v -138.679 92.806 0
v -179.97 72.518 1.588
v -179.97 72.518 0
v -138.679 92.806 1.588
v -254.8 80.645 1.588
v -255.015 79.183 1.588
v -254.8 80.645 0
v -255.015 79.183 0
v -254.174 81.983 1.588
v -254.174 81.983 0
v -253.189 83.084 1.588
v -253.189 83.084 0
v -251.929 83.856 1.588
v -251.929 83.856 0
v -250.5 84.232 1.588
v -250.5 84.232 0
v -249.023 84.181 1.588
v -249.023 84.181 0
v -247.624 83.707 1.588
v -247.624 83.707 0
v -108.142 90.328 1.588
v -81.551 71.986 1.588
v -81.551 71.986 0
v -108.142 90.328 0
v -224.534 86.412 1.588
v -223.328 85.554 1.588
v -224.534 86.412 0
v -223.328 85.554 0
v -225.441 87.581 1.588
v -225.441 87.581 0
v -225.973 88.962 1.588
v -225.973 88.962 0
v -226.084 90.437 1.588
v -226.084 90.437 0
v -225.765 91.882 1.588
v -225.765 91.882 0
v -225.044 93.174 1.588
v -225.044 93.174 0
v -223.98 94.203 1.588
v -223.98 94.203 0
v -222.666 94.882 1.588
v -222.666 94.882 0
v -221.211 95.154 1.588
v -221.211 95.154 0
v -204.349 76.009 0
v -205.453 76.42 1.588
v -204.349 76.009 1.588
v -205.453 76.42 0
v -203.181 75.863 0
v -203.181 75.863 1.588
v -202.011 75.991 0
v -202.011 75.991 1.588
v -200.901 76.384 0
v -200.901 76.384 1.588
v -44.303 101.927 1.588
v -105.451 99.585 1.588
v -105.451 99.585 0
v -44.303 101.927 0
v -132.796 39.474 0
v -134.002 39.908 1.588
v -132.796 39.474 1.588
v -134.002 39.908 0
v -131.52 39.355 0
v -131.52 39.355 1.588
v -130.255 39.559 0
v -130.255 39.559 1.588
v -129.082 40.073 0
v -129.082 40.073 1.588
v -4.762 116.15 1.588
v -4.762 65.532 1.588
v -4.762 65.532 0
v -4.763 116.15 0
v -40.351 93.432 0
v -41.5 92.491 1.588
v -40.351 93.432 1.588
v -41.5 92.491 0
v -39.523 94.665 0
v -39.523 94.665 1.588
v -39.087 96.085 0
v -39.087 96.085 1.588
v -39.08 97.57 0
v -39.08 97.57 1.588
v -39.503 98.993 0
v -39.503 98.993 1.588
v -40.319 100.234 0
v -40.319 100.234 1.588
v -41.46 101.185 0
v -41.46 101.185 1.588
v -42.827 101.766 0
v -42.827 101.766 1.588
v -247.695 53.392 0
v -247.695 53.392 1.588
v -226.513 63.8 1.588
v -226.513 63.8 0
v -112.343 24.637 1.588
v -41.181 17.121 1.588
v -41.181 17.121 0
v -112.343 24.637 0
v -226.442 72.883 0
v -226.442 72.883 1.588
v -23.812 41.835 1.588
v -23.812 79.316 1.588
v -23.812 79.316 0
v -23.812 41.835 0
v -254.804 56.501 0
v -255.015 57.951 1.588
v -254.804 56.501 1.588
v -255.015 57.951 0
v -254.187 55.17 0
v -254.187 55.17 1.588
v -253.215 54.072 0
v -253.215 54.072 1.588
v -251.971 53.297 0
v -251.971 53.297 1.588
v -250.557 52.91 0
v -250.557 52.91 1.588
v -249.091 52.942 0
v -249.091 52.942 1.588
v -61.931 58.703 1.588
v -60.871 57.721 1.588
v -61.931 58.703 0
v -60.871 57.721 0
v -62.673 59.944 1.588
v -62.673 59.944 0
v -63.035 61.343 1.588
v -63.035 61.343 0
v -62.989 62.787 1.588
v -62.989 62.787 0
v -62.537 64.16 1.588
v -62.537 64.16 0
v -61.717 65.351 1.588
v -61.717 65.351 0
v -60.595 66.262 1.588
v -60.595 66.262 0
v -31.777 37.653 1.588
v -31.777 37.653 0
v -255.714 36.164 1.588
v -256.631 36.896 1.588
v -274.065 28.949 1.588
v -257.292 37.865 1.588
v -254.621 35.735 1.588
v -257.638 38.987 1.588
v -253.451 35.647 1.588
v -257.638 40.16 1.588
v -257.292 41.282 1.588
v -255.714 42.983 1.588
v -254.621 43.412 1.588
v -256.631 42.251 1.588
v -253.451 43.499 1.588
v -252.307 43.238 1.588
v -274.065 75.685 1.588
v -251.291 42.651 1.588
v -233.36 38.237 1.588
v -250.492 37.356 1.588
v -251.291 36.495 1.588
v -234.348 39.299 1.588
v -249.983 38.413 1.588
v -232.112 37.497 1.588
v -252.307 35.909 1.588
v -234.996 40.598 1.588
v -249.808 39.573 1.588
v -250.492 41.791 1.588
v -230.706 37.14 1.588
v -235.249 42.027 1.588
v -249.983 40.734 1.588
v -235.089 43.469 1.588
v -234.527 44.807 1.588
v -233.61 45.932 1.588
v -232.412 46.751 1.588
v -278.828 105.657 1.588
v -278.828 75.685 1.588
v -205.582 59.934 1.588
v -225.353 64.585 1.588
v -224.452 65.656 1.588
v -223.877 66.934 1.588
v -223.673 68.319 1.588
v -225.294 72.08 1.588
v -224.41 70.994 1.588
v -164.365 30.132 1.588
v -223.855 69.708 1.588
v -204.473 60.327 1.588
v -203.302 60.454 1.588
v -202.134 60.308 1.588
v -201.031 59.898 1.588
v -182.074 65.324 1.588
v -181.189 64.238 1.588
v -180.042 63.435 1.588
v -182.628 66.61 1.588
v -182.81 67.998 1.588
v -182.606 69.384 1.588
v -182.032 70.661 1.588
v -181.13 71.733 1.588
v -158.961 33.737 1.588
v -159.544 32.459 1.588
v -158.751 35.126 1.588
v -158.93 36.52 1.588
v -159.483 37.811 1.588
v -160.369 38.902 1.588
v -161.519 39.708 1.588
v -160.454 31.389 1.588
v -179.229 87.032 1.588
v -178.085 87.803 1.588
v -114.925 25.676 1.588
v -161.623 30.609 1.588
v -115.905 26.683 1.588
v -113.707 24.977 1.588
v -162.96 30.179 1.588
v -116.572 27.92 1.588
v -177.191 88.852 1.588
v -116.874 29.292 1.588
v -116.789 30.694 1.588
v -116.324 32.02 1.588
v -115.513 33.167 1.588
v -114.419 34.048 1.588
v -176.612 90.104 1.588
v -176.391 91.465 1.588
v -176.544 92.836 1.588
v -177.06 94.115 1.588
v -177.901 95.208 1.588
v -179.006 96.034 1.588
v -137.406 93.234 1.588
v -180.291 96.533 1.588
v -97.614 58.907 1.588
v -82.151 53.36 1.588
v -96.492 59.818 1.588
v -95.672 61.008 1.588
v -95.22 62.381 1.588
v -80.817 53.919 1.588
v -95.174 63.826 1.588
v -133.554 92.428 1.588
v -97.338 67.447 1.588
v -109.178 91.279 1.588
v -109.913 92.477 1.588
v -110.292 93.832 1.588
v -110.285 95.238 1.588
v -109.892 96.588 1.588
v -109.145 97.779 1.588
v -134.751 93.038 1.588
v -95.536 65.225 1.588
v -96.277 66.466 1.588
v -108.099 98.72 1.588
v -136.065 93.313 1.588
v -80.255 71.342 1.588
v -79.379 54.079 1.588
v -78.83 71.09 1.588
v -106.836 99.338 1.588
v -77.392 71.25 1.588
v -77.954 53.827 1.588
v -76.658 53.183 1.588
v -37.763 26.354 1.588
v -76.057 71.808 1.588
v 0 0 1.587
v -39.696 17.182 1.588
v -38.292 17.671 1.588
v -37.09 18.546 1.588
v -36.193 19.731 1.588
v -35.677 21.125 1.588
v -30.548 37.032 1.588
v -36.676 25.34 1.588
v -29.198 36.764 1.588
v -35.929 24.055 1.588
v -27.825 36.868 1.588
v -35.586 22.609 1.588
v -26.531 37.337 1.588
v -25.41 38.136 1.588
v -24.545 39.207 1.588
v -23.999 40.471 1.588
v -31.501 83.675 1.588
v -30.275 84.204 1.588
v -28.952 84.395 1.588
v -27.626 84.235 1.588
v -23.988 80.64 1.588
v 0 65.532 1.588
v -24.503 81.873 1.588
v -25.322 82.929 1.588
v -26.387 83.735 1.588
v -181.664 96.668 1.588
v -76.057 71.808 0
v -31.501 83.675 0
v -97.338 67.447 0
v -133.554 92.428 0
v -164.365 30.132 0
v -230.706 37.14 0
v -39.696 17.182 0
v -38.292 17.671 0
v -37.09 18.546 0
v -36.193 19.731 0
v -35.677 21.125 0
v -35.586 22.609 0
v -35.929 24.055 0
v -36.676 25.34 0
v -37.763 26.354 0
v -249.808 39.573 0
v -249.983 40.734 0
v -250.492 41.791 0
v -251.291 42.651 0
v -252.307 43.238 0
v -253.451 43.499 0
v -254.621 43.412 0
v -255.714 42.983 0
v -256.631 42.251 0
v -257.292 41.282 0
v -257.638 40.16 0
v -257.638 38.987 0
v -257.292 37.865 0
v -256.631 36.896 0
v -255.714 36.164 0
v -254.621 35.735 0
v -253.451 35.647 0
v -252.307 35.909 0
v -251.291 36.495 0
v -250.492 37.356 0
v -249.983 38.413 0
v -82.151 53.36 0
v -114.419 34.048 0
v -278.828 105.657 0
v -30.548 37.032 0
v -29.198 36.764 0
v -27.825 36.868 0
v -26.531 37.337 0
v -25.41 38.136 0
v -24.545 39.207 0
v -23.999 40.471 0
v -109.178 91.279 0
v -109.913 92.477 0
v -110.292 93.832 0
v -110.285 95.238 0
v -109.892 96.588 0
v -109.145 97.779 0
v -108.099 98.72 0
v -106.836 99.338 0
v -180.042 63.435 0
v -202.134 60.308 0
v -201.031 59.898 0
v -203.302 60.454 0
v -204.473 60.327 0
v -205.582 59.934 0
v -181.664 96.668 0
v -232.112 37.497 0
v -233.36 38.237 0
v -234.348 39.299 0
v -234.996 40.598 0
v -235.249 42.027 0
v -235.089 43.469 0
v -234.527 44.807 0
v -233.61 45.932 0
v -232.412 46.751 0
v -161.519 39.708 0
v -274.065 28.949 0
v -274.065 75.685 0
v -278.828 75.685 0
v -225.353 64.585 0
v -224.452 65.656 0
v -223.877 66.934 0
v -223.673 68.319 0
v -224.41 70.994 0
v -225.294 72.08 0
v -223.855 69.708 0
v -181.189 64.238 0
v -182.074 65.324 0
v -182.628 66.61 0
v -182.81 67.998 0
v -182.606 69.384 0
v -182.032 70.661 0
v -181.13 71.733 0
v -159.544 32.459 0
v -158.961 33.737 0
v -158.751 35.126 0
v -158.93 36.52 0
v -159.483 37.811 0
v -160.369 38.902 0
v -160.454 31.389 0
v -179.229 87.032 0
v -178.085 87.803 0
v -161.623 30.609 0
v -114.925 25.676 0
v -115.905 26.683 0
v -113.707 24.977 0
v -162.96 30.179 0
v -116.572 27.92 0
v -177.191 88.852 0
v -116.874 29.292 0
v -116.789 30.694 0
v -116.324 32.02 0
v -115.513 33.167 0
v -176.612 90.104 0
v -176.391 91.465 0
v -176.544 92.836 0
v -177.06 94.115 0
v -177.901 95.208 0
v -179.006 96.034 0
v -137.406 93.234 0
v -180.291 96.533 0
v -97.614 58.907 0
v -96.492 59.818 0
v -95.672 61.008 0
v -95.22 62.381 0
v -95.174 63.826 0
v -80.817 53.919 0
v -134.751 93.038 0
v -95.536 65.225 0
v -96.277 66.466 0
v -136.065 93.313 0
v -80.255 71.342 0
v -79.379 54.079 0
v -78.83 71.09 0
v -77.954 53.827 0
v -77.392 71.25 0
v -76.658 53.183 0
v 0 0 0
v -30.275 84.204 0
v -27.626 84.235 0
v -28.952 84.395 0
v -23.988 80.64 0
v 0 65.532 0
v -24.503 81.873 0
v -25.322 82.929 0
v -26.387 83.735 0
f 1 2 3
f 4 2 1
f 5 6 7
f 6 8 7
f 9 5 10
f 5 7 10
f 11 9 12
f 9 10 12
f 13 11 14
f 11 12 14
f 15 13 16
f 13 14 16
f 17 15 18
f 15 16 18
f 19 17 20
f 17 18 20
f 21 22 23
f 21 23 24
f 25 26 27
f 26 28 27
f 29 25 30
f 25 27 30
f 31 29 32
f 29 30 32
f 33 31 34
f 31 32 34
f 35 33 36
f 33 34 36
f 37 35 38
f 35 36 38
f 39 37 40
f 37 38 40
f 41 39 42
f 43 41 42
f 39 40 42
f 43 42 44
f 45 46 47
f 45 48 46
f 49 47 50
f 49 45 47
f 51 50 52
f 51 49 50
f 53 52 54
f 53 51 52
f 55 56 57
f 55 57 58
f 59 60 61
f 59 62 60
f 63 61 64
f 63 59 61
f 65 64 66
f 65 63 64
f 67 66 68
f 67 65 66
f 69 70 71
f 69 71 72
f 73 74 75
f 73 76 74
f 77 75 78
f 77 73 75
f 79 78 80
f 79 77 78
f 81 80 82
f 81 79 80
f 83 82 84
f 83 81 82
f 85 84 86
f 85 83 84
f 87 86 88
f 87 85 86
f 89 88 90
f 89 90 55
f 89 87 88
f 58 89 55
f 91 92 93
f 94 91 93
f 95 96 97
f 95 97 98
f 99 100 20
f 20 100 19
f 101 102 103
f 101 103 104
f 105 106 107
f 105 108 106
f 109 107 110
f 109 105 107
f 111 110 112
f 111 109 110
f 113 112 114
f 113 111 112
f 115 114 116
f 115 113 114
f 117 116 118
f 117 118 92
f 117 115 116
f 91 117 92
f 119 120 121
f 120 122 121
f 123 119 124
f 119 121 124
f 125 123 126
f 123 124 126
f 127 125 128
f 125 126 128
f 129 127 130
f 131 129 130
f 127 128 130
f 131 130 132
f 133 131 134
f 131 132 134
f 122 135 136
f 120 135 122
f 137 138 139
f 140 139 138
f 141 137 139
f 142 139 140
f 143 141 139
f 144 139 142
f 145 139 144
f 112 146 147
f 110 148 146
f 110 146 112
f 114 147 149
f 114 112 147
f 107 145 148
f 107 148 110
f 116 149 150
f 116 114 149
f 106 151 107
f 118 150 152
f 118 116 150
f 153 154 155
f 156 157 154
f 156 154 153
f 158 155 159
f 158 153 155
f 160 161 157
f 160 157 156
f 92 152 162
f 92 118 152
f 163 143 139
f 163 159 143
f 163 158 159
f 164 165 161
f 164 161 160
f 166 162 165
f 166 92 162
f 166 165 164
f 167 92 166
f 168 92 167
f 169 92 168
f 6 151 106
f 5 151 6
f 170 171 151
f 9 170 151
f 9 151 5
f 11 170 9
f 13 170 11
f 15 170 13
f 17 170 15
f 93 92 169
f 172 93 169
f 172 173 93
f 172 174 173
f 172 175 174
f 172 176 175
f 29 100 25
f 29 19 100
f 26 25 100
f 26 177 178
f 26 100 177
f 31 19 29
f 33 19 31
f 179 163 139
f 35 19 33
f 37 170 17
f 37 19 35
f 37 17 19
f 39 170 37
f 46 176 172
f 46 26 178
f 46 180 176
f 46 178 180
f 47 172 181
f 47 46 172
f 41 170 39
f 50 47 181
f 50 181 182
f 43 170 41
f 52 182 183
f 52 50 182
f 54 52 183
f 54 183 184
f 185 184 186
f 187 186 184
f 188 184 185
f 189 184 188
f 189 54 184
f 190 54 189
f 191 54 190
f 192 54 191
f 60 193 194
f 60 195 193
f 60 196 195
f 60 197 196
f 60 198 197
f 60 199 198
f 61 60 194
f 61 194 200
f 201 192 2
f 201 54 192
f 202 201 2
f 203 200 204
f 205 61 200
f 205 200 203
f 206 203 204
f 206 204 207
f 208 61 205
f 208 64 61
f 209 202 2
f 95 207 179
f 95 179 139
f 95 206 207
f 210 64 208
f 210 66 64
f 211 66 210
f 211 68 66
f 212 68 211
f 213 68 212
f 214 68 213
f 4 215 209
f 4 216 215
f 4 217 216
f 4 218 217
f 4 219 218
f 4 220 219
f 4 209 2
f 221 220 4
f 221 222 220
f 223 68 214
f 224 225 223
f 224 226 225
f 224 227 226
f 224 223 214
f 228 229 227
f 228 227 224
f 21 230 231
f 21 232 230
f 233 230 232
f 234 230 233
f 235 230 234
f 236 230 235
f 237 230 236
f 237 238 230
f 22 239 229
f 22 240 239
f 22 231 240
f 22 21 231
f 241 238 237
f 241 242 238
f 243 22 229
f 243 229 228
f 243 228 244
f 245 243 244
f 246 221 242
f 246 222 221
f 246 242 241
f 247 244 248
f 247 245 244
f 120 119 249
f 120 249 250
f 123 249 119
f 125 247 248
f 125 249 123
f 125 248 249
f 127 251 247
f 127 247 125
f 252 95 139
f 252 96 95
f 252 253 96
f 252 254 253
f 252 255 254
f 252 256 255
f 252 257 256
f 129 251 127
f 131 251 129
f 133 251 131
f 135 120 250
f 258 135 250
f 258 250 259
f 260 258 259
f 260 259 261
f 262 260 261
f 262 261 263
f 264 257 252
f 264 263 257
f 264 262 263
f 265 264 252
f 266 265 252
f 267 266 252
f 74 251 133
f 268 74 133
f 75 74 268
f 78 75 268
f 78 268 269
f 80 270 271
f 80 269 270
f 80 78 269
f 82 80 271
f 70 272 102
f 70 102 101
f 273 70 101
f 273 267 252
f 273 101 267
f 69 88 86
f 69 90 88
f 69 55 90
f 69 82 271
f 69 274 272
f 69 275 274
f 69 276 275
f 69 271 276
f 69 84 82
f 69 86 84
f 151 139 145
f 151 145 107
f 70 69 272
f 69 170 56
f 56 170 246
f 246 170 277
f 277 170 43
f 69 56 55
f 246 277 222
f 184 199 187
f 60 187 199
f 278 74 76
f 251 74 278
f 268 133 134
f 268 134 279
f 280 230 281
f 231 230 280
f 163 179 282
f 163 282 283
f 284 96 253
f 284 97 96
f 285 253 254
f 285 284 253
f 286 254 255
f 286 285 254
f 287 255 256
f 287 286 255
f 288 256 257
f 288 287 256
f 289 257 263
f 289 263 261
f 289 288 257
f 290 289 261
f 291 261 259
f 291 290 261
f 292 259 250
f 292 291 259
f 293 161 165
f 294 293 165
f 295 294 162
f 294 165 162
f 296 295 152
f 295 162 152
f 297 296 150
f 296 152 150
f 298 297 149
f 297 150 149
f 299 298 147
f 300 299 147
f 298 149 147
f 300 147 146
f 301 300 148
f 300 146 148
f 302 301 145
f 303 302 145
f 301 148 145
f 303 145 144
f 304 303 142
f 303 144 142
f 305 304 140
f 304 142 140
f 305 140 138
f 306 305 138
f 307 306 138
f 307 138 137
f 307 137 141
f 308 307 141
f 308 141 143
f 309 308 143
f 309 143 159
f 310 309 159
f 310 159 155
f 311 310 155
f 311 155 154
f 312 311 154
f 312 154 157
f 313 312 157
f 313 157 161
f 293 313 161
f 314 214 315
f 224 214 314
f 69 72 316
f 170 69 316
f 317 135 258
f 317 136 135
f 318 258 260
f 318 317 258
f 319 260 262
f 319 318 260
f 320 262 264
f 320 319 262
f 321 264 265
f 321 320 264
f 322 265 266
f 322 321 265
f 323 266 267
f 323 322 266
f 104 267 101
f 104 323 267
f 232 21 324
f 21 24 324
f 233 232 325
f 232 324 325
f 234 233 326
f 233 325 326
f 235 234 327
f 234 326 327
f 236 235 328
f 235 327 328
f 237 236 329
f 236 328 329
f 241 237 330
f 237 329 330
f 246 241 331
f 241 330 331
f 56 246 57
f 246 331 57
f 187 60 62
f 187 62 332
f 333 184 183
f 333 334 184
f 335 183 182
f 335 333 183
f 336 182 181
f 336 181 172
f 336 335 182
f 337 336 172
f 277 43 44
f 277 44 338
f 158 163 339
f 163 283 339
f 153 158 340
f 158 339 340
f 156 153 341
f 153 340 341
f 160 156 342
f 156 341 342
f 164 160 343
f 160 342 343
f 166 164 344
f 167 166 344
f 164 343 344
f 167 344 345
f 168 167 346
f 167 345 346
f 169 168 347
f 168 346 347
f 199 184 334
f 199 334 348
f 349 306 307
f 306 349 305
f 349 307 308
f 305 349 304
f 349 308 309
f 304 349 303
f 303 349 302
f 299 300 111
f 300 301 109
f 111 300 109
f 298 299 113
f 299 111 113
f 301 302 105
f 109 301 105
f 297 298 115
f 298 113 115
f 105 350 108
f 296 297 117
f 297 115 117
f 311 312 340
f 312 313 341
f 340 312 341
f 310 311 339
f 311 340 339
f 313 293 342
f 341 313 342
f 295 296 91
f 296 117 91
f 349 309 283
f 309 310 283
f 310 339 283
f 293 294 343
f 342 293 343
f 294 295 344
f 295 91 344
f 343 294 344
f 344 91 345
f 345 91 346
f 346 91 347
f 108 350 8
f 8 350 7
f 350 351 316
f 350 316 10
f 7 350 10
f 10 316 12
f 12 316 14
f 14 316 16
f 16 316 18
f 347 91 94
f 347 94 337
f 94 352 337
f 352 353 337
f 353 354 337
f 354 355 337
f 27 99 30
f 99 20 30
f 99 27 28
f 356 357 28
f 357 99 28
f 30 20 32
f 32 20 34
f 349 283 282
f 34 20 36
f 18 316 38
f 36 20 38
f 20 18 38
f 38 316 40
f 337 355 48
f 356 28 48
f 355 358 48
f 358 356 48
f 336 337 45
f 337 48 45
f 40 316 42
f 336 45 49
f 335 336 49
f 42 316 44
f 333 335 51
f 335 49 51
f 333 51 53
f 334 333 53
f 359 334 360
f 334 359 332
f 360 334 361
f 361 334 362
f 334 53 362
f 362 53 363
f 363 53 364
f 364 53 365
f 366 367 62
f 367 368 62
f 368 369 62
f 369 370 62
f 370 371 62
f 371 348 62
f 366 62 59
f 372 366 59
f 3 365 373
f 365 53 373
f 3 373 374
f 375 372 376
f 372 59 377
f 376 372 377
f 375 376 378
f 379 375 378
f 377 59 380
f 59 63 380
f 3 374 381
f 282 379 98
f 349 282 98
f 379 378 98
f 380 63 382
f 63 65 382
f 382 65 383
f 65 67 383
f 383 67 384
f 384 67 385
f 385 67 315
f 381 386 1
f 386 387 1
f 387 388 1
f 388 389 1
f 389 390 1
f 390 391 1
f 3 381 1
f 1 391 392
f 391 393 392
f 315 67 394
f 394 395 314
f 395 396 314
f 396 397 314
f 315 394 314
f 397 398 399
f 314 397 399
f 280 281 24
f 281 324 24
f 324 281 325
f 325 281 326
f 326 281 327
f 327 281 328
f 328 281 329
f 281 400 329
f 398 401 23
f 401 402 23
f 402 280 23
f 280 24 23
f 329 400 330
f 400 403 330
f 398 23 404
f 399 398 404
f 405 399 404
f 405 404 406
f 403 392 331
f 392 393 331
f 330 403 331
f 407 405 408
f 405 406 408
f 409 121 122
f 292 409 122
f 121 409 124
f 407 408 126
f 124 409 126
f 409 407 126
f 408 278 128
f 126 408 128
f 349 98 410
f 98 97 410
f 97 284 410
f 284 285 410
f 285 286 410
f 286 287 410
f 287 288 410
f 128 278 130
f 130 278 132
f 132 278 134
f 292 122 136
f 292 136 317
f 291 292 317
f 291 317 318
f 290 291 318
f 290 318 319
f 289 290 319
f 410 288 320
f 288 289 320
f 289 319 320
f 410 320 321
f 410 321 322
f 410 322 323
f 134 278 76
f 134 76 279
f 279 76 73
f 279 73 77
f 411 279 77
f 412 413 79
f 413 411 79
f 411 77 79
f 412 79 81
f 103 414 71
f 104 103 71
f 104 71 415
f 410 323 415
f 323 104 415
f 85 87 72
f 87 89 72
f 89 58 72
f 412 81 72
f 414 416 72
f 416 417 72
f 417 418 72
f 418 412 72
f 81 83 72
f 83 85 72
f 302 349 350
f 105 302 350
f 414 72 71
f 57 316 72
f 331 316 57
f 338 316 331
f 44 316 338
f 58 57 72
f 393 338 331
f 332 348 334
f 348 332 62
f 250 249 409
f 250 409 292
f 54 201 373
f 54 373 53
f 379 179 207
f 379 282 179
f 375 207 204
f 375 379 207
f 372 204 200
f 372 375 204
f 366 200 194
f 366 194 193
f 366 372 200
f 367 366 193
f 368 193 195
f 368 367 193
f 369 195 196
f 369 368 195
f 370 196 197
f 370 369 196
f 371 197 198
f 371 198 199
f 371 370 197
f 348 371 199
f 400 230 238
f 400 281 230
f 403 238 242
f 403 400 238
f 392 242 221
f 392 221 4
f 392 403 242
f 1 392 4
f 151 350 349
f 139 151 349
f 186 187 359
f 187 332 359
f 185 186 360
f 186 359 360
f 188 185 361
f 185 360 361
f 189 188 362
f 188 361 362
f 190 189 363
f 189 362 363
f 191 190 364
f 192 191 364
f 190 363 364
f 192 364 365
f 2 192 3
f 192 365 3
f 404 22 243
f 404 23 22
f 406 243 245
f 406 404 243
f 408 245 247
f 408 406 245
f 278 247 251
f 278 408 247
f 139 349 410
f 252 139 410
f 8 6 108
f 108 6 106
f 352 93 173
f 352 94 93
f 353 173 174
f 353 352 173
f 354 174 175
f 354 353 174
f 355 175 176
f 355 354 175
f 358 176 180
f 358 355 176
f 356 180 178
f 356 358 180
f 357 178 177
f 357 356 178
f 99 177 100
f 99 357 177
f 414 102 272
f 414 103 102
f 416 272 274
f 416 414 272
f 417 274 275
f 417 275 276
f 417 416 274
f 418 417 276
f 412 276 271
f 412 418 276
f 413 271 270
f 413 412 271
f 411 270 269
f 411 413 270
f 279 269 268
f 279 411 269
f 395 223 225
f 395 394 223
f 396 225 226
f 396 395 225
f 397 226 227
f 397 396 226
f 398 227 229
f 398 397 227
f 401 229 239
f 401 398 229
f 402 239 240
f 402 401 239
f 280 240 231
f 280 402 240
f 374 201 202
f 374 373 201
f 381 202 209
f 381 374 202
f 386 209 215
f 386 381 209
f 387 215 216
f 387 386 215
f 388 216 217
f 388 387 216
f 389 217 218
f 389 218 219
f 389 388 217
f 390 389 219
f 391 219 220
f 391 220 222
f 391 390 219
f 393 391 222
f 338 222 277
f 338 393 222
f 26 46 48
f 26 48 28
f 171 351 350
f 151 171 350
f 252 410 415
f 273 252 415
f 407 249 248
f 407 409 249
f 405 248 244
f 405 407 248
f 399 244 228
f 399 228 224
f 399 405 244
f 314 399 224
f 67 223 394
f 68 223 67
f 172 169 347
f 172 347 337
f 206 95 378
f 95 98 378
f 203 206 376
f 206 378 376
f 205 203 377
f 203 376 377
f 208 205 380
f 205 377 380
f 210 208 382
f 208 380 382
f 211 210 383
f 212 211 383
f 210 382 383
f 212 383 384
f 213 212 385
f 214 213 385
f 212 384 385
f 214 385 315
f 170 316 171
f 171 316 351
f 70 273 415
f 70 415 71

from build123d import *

# Parameters (mm, degrees)
BOSS_EXTRUDE1_DEPTH = 1.5875
CUT_EXTRUDE1_DEPTH  = 303.12680487
CUT_EXTRUDE2_DEPTH  = 1.5875
FILLET1_R           = 5.08
SKETCH4_R           = 3.937
CUT_EXTRUDE3_DEPTH  = 303.056645934


with BuildPart() as part:
    # Sketch1 → Boss-Extrude1 (new body)
    with BuildSketch(Plane.XY):
        Polygon((-274.065317552, 28.949090055), (0, 0), (0, 116.332), (-278.827817552, 105.657090055), (-278.827817552, 88.385090055), (-278.827817552, 75.685090055), (-274.065317552, 75.685090055), align=None)
    extrude(amount=BOSS_EXTRUDE1_DEPTH)

    # Sketch2 → Cut-Extrude1 (cut, through all)
    with BuildSketch(Plane.XY.offset(1.5875)):
        Polygon((0, 116.332), (0, 65.532), (-4.7625, 65.532), (-4.7625, 116.14966791), align=None)
        Polygon((0, -5.469950558), (-4.7625, -5.469950558), (-4.7625, 0.503055413), (0, 0), align=None)
    extrude(amount=-CUT_EXTRUDE1_DEPTH, mode=Mode.SUBTRACT)

    # Sketch3 → Cut-Extrude2 (cut)
    with BuildSketch(Plane.XY.offset(1.5875)):
        Polygon((-240.657781537, 94.409124071), (-157.755224497, 97.583044587), (-203.185900054, 75.261166333), align=None)
        Polygon((-255.015317552, 87.483730445), (-255.015317552, 49.79533442), (-217.414707933, 68.269993226), align=None)
        Polygon((-248.210308368, 38.988718693), (-203.29748305, 61.056156751), (-137.156149504, 27.258241905), align=None)
        Polygon((-189.068675171, 68.047329858), (-136.005712706, 94.119250944), (-90.836715855, 62.962907236), (-131.496140727, 38.628031633), align=None)
        Polygon((-120.716079793, 99.001086509), (-24.466190753, 102.686009006), (-78.860877706, 70.130508168), align=None)
        Polygon((-127.472455762, 26.235368508), (-79.347844483, 55.0381967), (-21.337942125, 15.024546137), align=None)
        Polygon((-67.372006334, 62.205797632), (-23.8125, 88.276386956), (-23.8125, 32.159636644), align=None)
    extrude(amount=-CUT_EXTRUDE2_DEPTH, mode=Mode.SUBTRACT)

    # Fillet1
    fillet1_edges = [part.edges().sort_by_distance(p)[0] for p in [
        (-255.015317552, 87.483730445, 0.79375),
        (-217.414707933, 68.269993226, 0.79375),
        (-255.015317552, 49.79533442, 0.79375),
        (-127.472455762, 26.235368508, 0.79375),
        (-21.337942125, 15.024546137, 0.79375),
        (-79.347844483, 55.0381967, 0.79375),
        (-248.210308368, 38.988718693, 0.79375),
        (-137.156149504, 27.258241905, 0.79375),
        (-203.29748305, 61.056156751, 0.79375),
        (-240.657781537, 94.409124071, 0.79375),
        (-203.185900054, 75.261166333, 0.79375),
        (-157.755224497, 97.583044587, 0.79375),
        (-136.005712706, 94.119250944, 0.79375),
        (-189.068675171, 68.047329858, 0.79375),
        (-131.496140727, 38.628031633, 0.79375),
        (-90.836715855, 62.962907236, 0.79375),
        (-67.372006334, 62.205797632, 0.79375),
        (-23.8125, 32.159636644, 0.79375),
        (-23.8125, 88.276386956, 0.79375),
        (-24.466190753, 102.686009006, 0.79375),
        (-120.716079793, 99.001086509, 0.79375),
        (-78.860877706, 70.130508168, 0.79375),
    ]]
    fillet(fillet1_edges, radius=FILLET1_R)

    # Sketch4 → Cut-Extrude3 (cut, through all)
    with BuildSketch(Plane.XY.offset(1.5875)):
        with Locations((-253.745317552, 39.57337304)):
            Circle(SKETCH4_R)
    extrude(amount=-CUT_EXTRUDE3_DEPTH, mode=Mode.SUBTRACT)


solid = part.part
